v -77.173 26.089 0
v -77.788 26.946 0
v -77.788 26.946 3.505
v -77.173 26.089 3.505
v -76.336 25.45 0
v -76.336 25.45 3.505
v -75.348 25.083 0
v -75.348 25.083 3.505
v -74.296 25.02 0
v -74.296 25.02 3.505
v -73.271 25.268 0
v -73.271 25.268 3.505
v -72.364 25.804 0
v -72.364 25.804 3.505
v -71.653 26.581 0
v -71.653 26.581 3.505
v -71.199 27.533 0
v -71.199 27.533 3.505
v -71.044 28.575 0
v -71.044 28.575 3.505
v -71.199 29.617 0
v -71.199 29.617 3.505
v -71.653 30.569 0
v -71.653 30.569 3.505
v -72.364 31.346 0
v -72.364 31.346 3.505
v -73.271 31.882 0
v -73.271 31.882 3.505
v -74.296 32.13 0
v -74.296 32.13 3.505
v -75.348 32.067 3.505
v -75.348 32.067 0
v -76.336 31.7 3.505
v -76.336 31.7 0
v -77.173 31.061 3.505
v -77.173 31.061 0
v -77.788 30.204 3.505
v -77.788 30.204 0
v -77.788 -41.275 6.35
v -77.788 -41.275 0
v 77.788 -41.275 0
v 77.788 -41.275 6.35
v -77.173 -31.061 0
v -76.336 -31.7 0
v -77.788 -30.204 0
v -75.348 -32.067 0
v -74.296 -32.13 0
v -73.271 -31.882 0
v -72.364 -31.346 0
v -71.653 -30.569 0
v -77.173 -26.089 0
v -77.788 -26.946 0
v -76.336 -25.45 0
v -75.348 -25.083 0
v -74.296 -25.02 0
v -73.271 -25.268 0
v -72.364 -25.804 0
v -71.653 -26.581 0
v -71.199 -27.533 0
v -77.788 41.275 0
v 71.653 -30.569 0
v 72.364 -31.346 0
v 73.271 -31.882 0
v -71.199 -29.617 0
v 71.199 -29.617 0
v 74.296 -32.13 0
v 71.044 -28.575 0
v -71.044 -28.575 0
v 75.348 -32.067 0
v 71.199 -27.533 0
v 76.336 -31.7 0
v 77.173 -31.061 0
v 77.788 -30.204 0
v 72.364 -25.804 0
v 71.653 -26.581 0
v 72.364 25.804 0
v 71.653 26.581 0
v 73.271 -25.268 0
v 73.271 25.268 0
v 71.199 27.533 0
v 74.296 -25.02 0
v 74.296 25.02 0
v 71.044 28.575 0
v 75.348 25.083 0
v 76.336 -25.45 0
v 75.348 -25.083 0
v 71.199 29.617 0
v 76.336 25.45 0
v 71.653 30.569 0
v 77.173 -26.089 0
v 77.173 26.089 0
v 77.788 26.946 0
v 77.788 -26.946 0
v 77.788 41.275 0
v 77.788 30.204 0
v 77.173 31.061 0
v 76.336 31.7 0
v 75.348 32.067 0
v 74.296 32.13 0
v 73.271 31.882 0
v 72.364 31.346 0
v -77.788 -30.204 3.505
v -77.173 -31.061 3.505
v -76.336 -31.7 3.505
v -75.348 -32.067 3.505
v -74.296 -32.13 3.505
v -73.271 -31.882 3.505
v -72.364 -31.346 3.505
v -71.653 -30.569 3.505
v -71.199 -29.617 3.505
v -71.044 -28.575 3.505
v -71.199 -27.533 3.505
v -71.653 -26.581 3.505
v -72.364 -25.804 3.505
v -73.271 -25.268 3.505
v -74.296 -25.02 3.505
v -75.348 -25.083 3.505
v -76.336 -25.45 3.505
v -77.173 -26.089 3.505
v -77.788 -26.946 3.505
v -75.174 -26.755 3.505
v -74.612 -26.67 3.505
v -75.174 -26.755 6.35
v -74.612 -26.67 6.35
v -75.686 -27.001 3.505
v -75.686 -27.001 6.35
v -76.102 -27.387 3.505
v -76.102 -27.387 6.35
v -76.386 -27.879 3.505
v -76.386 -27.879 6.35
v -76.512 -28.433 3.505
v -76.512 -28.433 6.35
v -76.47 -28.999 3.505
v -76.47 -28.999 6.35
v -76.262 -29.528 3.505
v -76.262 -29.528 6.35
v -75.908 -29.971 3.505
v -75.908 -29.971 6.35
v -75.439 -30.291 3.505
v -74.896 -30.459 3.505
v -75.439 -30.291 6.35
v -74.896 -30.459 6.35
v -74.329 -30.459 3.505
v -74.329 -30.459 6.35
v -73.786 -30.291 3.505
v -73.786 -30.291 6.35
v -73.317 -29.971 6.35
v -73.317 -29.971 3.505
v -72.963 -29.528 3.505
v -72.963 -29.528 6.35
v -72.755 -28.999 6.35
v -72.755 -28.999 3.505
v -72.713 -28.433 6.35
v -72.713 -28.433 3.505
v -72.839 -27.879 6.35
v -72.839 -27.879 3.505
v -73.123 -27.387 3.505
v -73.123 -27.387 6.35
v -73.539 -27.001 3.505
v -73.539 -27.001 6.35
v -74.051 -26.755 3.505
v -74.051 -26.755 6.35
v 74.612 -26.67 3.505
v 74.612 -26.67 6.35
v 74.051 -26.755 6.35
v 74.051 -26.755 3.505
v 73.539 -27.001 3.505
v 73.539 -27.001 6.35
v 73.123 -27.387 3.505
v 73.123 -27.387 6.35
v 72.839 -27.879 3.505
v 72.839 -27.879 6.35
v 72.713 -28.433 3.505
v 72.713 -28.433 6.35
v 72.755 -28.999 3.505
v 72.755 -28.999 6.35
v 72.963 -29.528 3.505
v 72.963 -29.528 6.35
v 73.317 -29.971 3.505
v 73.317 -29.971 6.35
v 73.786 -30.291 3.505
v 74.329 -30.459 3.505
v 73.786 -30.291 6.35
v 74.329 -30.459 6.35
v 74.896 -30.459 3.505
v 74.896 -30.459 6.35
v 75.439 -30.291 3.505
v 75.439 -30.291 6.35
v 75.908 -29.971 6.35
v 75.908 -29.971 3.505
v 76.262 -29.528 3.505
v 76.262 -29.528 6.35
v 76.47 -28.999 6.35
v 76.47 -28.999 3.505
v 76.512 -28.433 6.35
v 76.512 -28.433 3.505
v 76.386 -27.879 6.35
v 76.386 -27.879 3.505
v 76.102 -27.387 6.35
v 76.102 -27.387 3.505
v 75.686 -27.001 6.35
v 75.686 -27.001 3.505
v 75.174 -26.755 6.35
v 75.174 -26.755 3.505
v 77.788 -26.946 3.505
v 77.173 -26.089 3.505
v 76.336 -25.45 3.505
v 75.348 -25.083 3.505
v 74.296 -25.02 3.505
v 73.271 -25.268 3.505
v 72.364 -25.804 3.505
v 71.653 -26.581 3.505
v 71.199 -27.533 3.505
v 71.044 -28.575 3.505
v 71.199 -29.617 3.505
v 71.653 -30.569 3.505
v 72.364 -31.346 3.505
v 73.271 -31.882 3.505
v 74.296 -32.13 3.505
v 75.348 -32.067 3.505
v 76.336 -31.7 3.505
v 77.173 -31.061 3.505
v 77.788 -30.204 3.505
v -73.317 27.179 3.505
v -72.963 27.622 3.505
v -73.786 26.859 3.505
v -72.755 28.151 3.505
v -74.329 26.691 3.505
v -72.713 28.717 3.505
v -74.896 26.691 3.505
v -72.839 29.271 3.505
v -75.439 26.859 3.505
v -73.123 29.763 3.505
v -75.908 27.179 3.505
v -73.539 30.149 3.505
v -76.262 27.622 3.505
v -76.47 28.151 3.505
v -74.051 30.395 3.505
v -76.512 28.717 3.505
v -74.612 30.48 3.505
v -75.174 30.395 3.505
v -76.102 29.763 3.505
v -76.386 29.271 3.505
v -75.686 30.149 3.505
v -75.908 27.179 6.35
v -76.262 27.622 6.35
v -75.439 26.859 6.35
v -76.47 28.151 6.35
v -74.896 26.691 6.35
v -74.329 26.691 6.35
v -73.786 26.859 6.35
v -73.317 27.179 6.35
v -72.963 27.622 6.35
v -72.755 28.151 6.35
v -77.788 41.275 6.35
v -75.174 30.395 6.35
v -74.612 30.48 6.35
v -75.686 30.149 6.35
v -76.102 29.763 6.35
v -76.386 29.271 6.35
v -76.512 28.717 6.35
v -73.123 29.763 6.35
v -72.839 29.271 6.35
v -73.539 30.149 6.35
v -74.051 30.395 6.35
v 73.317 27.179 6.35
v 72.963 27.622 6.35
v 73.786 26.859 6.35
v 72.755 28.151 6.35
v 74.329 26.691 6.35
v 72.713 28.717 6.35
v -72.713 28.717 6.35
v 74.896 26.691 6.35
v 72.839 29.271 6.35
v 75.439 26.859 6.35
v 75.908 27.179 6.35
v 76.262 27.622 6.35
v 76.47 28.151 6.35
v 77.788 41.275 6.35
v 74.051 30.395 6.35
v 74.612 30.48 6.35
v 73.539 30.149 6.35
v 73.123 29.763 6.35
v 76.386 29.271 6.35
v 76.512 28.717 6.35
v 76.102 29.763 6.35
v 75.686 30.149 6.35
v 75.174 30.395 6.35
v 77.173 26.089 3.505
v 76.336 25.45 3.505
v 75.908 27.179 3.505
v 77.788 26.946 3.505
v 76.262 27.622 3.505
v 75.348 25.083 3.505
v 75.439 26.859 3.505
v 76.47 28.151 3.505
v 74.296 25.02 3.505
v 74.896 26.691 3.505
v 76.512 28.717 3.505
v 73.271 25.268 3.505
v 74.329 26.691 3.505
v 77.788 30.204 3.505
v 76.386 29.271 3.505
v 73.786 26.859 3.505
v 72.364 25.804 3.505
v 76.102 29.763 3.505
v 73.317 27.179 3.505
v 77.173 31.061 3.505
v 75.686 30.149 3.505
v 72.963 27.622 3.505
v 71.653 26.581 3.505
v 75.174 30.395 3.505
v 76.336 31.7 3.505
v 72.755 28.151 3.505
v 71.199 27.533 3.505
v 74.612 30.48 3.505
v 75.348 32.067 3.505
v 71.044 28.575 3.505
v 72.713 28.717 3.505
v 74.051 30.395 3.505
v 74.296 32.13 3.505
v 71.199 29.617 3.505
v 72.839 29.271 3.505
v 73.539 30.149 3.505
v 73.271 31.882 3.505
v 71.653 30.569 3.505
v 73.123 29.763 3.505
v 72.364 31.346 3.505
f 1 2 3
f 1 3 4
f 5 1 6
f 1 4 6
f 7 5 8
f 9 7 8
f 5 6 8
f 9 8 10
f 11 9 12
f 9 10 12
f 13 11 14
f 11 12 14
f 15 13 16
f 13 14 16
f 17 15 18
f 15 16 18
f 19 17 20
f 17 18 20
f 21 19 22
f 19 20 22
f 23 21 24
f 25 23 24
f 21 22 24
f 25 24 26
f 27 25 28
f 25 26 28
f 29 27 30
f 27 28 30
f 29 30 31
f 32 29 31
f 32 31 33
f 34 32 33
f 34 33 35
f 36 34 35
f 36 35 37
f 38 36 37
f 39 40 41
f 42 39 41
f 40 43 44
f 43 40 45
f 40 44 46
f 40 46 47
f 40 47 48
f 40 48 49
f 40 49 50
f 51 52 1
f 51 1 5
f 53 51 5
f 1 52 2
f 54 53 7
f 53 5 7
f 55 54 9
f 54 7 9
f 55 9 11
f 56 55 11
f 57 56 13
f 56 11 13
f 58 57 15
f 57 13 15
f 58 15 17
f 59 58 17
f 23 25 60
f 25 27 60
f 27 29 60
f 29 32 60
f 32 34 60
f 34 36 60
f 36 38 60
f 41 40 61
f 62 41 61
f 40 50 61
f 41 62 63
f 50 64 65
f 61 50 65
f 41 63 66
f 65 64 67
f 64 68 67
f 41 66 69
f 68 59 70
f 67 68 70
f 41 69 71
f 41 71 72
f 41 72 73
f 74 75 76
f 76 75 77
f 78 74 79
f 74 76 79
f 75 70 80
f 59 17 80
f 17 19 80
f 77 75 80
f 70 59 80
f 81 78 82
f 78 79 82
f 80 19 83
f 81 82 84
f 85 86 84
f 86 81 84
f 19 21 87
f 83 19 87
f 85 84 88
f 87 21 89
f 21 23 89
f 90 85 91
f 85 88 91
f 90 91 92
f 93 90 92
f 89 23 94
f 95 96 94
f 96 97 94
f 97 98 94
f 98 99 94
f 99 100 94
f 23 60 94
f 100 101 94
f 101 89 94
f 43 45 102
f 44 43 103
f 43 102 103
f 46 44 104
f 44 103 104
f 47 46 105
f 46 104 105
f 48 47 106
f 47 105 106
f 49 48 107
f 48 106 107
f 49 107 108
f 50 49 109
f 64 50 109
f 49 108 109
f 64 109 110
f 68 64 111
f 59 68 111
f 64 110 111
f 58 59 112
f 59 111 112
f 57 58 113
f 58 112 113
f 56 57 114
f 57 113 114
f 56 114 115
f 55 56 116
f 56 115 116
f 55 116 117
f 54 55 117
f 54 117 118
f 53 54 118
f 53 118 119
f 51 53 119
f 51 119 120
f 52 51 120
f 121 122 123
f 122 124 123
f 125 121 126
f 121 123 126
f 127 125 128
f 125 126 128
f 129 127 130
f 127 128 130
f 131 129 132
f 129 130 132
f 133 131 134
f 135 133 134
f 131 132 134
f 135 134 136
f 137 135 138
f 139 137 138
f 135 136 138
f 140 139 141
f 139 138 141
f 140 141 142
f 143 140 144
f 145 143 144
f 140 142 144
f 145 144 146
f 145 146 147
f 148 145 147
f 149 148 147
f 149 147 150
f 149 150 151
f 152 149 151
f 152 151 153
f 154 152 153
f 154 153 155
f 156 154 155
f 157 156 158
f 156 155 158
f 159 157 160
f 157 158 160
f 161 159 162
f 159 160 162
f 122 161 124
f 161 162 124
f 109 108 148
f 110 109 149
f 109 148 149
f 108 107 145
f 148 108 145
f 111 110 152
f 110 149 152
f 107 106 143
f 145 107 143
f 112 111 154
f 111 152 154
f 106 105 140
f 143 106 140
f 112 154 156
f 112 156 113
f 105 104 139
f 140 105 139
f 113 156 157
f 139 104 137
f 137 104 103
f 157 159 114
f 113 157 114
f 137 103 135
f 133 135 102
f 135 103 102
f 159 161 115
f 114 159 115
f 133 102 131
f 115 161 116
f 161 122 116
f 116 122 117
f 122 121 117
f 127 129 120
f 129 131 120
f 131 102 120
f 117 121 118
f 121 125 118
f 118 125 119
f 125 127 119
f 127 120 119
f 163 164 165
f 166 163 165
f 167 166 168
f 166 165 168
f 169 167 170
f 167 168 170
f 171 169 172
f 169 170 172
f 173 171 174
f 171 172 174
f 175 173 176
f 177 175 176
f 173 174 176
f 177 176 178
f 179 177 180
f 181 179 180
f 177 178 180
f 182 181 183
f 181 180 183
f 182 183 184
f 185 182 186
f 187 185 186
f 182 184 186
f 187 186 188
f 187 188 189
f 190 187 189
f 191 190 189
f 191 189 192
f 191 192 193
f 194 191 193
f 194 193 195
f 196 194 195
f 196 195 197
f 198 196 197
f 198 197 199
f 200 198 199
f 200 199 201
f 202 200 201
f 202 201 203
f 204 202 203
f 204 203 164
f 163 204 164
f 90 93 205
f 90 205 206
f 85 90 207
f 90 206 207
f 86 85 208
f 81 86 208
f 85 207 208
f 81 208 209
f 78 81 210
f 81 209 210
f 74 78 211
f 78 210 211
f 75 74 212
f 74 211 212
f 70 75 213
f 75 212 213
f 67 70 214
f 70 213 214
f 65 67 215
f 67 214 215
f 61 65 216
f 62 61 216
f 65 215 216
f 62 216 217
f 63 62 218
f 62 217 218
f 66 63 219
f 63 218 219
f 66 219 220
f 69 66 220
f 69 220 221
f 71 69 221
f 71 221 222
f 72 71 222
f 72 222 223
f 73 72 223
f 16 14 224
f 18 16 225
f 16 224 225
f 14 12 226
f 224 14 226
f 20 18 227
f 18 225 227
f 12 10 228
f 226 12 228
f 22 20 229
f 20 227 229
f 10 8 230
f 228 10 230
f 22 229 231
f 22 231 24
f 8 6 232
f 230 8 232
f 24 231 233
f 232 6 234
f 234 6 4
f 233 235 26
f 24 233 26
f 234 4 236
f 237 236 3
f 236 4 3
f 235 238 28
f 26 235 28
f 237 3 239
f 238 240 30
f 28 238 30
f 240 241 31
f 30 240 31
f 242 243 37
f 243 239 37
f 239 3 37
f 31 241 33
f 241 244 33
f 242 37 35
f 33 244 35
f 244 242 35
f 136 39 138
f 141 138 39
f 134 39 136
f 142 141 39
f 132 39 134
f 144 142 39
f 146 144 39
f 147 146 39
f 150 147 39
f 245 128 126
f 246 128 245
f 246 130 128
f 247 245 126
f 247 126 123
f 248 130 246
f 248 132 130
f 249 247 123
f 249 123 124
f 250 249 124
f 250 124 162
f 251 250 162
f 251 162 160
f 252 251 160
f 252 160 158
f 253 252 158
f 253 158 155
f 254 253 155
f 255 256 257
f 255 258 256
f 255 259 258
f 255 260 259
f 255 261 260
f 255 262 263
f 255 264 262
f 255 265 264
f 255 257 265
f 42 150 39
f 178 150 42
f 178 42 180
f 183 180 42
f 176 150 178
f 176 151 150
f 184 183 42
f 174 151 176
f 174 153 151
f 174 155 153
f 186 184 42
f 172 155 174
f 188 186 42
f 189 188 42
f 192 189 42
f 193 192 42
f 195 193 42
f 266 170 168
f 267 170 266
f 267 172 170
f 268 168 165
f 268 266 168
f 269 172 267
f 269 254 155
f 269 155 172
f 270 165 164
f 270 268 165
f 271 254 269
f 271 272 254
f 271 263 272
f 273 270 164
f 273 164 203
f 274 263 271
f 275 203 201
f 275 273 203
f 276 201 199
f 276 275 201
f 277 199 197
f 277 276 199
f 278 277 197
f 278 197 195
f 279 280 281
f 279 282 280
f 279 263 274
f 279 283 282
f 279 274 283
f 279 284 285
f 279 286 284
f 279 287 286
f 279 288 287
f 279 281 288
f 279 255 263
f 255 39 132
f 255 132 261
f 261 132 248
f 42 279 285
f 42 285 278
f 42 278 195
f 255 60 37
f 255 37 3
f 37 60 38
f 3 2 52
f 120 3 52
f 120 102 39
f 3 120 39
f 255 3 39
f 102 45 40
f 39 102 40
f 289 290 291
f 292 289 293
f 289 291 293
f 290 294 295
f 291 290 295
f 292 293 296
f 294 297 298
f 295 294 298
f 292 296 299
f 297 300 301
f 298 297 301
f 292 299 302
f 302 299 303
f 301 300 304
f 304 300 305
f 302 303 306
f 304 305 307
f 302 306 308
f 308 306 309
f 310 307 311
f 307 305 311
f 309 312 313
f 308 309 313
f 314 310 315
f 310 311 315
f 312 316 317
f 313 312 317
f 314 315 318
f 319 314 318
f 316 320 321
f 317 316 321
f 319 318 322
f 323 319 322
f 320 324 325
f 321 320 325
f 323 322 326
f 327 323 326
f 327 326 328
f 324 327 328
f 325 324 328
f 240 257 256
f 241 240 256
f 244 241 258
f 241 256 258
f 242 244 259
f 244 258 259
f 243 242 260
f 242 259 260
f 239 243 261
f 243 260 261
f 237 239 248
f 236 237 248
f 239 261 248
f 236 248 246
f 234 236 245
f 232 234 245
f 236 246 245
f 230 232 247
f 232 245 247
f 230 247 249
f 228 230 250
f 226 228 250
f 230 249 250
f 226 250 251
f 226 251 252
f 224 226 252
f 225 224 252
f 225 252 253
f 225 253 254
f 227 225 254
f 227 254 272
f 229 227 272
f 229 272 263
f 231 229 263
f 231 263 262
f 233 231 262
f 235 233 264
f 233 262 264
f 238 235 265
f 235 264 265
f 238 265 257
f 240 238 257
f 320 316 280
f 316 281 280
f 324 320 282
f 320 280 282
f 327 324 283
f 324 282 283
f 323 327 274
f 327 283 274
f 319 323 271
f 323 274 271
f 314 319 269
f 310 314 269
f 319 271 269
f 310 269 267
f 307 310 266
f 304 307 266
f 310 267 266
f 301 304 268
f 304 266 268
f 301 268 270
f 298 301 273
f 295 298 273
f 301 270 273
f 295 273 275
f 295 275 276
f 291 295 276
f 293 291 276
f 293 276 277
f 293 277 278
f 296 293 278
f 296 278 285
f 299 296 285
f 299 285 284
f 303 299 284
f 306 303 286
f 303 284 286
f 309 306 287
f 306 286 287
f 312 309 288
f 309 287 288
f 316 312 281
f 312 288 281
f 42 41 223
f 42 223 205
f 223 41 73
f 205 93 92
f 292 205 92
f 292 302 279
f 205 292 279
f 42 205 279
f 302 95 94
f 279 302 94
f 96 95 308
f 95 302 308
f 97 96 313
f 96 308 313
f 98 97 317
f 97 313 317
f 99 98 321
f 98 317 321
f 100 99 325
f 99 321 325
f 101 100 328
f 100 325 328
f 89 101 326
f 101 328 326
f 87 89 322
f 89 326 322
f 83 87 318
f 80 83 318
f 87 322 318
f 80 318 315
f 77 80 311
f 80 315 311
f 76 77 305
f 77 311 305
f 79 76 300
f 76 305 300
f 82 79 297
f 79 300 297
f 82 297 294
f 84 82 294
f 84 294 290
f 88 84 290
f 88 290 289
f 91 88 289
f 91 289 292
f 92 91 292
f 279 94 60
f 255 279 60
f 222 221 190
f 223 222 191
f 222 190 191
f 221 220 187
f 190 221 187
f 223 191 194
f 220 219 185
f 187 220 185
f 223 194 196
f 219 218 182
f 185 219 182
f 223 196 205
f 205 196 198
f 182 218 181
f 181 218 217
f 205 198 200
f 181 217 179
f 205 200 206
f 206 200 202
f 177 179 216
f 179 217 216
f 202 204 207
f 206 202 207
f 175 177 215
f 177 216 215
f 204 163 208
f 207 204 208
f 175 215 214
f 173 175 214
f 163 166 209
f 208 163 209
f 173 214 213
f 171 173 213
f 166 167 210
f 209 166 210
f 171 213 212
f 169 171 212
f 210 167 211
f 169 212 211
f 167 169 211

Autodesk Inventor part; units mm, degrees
ref_plane "YZ Plane" through (0, 0, 0) normal (1, 0, 0) x (0, 1, 0)
ref_plane "XZ Plane" through (0, 0, 0) normal (0, 1, 0) x (-1, 0, 0)
ref_plane "XY Plane" through (0, 0, 0) normal (0, 0, 1) x (1, 0, 0)
sketch "Sketch1" plane through (0, 0, 0) normal (0, 0, 1) x (1, 0, 0)
  line L0 (-77.7875, -41.275) -> (77.7875, -41.275)
  line L1 (77.7875, -41.275) -> (77.7875, 41.275)
  line L2 (77.7875, 41.275) -> (-77.7875, 41.275)
  line L3 (-77.7875, 41.275) -> (-77.7875, -41.275)
  line L4 (-77.7875, -41.275) -> (77.7875, 41.275) construction
  line L5 (77.7875, -41.275) -> (-77.7875, 41.275) construction
  point P0 (0, 0)
  dimension "d0" = 155.575
  dimension "d1" = 82.55
extrude "Extrusion1" add sketch "Sketch1" along normal blind 6.35
sketch "Sketch2" plane through (0, 0, 0) normal (0, 0, -1) x (-1, 0, 0)
  line L0 (-74.6125, -28.575) -> (74.6125, -28.575)
  line L1 (74.6125, -28.575) -> (74.6125, 28.575)
  line L2 (74.6125, 28.575) -> (-74.6125, 28.575)
  line L3 (-74.6125, 28.575) -> (-74.6125, -28.575)
  line L4 (-74.6125, -28.575) -> (74.6125, 28.575) construction
  line L5 (74.6125, -28.575) -> (-74.6125, 28.575) construction
  point P0 (0, 0)
  dimension "d4" = 149.225
  dimension "d5" = 57.15
hole "Hole1" at (74.6125, 28.575, 0) at (74.6125, -28.575, 0) at (-74.6125, 28.575, 0) at (-74.6125, -28.575, 0) direction (0, 0, 1) diameter 3.81 end through all counterbore diameter 7.1374 counterbore depth 3.5052 clearance for "Socket Head Cap Screw" size "#6" standard "Ansi Unified Screw Threads"
properties part number "front"
